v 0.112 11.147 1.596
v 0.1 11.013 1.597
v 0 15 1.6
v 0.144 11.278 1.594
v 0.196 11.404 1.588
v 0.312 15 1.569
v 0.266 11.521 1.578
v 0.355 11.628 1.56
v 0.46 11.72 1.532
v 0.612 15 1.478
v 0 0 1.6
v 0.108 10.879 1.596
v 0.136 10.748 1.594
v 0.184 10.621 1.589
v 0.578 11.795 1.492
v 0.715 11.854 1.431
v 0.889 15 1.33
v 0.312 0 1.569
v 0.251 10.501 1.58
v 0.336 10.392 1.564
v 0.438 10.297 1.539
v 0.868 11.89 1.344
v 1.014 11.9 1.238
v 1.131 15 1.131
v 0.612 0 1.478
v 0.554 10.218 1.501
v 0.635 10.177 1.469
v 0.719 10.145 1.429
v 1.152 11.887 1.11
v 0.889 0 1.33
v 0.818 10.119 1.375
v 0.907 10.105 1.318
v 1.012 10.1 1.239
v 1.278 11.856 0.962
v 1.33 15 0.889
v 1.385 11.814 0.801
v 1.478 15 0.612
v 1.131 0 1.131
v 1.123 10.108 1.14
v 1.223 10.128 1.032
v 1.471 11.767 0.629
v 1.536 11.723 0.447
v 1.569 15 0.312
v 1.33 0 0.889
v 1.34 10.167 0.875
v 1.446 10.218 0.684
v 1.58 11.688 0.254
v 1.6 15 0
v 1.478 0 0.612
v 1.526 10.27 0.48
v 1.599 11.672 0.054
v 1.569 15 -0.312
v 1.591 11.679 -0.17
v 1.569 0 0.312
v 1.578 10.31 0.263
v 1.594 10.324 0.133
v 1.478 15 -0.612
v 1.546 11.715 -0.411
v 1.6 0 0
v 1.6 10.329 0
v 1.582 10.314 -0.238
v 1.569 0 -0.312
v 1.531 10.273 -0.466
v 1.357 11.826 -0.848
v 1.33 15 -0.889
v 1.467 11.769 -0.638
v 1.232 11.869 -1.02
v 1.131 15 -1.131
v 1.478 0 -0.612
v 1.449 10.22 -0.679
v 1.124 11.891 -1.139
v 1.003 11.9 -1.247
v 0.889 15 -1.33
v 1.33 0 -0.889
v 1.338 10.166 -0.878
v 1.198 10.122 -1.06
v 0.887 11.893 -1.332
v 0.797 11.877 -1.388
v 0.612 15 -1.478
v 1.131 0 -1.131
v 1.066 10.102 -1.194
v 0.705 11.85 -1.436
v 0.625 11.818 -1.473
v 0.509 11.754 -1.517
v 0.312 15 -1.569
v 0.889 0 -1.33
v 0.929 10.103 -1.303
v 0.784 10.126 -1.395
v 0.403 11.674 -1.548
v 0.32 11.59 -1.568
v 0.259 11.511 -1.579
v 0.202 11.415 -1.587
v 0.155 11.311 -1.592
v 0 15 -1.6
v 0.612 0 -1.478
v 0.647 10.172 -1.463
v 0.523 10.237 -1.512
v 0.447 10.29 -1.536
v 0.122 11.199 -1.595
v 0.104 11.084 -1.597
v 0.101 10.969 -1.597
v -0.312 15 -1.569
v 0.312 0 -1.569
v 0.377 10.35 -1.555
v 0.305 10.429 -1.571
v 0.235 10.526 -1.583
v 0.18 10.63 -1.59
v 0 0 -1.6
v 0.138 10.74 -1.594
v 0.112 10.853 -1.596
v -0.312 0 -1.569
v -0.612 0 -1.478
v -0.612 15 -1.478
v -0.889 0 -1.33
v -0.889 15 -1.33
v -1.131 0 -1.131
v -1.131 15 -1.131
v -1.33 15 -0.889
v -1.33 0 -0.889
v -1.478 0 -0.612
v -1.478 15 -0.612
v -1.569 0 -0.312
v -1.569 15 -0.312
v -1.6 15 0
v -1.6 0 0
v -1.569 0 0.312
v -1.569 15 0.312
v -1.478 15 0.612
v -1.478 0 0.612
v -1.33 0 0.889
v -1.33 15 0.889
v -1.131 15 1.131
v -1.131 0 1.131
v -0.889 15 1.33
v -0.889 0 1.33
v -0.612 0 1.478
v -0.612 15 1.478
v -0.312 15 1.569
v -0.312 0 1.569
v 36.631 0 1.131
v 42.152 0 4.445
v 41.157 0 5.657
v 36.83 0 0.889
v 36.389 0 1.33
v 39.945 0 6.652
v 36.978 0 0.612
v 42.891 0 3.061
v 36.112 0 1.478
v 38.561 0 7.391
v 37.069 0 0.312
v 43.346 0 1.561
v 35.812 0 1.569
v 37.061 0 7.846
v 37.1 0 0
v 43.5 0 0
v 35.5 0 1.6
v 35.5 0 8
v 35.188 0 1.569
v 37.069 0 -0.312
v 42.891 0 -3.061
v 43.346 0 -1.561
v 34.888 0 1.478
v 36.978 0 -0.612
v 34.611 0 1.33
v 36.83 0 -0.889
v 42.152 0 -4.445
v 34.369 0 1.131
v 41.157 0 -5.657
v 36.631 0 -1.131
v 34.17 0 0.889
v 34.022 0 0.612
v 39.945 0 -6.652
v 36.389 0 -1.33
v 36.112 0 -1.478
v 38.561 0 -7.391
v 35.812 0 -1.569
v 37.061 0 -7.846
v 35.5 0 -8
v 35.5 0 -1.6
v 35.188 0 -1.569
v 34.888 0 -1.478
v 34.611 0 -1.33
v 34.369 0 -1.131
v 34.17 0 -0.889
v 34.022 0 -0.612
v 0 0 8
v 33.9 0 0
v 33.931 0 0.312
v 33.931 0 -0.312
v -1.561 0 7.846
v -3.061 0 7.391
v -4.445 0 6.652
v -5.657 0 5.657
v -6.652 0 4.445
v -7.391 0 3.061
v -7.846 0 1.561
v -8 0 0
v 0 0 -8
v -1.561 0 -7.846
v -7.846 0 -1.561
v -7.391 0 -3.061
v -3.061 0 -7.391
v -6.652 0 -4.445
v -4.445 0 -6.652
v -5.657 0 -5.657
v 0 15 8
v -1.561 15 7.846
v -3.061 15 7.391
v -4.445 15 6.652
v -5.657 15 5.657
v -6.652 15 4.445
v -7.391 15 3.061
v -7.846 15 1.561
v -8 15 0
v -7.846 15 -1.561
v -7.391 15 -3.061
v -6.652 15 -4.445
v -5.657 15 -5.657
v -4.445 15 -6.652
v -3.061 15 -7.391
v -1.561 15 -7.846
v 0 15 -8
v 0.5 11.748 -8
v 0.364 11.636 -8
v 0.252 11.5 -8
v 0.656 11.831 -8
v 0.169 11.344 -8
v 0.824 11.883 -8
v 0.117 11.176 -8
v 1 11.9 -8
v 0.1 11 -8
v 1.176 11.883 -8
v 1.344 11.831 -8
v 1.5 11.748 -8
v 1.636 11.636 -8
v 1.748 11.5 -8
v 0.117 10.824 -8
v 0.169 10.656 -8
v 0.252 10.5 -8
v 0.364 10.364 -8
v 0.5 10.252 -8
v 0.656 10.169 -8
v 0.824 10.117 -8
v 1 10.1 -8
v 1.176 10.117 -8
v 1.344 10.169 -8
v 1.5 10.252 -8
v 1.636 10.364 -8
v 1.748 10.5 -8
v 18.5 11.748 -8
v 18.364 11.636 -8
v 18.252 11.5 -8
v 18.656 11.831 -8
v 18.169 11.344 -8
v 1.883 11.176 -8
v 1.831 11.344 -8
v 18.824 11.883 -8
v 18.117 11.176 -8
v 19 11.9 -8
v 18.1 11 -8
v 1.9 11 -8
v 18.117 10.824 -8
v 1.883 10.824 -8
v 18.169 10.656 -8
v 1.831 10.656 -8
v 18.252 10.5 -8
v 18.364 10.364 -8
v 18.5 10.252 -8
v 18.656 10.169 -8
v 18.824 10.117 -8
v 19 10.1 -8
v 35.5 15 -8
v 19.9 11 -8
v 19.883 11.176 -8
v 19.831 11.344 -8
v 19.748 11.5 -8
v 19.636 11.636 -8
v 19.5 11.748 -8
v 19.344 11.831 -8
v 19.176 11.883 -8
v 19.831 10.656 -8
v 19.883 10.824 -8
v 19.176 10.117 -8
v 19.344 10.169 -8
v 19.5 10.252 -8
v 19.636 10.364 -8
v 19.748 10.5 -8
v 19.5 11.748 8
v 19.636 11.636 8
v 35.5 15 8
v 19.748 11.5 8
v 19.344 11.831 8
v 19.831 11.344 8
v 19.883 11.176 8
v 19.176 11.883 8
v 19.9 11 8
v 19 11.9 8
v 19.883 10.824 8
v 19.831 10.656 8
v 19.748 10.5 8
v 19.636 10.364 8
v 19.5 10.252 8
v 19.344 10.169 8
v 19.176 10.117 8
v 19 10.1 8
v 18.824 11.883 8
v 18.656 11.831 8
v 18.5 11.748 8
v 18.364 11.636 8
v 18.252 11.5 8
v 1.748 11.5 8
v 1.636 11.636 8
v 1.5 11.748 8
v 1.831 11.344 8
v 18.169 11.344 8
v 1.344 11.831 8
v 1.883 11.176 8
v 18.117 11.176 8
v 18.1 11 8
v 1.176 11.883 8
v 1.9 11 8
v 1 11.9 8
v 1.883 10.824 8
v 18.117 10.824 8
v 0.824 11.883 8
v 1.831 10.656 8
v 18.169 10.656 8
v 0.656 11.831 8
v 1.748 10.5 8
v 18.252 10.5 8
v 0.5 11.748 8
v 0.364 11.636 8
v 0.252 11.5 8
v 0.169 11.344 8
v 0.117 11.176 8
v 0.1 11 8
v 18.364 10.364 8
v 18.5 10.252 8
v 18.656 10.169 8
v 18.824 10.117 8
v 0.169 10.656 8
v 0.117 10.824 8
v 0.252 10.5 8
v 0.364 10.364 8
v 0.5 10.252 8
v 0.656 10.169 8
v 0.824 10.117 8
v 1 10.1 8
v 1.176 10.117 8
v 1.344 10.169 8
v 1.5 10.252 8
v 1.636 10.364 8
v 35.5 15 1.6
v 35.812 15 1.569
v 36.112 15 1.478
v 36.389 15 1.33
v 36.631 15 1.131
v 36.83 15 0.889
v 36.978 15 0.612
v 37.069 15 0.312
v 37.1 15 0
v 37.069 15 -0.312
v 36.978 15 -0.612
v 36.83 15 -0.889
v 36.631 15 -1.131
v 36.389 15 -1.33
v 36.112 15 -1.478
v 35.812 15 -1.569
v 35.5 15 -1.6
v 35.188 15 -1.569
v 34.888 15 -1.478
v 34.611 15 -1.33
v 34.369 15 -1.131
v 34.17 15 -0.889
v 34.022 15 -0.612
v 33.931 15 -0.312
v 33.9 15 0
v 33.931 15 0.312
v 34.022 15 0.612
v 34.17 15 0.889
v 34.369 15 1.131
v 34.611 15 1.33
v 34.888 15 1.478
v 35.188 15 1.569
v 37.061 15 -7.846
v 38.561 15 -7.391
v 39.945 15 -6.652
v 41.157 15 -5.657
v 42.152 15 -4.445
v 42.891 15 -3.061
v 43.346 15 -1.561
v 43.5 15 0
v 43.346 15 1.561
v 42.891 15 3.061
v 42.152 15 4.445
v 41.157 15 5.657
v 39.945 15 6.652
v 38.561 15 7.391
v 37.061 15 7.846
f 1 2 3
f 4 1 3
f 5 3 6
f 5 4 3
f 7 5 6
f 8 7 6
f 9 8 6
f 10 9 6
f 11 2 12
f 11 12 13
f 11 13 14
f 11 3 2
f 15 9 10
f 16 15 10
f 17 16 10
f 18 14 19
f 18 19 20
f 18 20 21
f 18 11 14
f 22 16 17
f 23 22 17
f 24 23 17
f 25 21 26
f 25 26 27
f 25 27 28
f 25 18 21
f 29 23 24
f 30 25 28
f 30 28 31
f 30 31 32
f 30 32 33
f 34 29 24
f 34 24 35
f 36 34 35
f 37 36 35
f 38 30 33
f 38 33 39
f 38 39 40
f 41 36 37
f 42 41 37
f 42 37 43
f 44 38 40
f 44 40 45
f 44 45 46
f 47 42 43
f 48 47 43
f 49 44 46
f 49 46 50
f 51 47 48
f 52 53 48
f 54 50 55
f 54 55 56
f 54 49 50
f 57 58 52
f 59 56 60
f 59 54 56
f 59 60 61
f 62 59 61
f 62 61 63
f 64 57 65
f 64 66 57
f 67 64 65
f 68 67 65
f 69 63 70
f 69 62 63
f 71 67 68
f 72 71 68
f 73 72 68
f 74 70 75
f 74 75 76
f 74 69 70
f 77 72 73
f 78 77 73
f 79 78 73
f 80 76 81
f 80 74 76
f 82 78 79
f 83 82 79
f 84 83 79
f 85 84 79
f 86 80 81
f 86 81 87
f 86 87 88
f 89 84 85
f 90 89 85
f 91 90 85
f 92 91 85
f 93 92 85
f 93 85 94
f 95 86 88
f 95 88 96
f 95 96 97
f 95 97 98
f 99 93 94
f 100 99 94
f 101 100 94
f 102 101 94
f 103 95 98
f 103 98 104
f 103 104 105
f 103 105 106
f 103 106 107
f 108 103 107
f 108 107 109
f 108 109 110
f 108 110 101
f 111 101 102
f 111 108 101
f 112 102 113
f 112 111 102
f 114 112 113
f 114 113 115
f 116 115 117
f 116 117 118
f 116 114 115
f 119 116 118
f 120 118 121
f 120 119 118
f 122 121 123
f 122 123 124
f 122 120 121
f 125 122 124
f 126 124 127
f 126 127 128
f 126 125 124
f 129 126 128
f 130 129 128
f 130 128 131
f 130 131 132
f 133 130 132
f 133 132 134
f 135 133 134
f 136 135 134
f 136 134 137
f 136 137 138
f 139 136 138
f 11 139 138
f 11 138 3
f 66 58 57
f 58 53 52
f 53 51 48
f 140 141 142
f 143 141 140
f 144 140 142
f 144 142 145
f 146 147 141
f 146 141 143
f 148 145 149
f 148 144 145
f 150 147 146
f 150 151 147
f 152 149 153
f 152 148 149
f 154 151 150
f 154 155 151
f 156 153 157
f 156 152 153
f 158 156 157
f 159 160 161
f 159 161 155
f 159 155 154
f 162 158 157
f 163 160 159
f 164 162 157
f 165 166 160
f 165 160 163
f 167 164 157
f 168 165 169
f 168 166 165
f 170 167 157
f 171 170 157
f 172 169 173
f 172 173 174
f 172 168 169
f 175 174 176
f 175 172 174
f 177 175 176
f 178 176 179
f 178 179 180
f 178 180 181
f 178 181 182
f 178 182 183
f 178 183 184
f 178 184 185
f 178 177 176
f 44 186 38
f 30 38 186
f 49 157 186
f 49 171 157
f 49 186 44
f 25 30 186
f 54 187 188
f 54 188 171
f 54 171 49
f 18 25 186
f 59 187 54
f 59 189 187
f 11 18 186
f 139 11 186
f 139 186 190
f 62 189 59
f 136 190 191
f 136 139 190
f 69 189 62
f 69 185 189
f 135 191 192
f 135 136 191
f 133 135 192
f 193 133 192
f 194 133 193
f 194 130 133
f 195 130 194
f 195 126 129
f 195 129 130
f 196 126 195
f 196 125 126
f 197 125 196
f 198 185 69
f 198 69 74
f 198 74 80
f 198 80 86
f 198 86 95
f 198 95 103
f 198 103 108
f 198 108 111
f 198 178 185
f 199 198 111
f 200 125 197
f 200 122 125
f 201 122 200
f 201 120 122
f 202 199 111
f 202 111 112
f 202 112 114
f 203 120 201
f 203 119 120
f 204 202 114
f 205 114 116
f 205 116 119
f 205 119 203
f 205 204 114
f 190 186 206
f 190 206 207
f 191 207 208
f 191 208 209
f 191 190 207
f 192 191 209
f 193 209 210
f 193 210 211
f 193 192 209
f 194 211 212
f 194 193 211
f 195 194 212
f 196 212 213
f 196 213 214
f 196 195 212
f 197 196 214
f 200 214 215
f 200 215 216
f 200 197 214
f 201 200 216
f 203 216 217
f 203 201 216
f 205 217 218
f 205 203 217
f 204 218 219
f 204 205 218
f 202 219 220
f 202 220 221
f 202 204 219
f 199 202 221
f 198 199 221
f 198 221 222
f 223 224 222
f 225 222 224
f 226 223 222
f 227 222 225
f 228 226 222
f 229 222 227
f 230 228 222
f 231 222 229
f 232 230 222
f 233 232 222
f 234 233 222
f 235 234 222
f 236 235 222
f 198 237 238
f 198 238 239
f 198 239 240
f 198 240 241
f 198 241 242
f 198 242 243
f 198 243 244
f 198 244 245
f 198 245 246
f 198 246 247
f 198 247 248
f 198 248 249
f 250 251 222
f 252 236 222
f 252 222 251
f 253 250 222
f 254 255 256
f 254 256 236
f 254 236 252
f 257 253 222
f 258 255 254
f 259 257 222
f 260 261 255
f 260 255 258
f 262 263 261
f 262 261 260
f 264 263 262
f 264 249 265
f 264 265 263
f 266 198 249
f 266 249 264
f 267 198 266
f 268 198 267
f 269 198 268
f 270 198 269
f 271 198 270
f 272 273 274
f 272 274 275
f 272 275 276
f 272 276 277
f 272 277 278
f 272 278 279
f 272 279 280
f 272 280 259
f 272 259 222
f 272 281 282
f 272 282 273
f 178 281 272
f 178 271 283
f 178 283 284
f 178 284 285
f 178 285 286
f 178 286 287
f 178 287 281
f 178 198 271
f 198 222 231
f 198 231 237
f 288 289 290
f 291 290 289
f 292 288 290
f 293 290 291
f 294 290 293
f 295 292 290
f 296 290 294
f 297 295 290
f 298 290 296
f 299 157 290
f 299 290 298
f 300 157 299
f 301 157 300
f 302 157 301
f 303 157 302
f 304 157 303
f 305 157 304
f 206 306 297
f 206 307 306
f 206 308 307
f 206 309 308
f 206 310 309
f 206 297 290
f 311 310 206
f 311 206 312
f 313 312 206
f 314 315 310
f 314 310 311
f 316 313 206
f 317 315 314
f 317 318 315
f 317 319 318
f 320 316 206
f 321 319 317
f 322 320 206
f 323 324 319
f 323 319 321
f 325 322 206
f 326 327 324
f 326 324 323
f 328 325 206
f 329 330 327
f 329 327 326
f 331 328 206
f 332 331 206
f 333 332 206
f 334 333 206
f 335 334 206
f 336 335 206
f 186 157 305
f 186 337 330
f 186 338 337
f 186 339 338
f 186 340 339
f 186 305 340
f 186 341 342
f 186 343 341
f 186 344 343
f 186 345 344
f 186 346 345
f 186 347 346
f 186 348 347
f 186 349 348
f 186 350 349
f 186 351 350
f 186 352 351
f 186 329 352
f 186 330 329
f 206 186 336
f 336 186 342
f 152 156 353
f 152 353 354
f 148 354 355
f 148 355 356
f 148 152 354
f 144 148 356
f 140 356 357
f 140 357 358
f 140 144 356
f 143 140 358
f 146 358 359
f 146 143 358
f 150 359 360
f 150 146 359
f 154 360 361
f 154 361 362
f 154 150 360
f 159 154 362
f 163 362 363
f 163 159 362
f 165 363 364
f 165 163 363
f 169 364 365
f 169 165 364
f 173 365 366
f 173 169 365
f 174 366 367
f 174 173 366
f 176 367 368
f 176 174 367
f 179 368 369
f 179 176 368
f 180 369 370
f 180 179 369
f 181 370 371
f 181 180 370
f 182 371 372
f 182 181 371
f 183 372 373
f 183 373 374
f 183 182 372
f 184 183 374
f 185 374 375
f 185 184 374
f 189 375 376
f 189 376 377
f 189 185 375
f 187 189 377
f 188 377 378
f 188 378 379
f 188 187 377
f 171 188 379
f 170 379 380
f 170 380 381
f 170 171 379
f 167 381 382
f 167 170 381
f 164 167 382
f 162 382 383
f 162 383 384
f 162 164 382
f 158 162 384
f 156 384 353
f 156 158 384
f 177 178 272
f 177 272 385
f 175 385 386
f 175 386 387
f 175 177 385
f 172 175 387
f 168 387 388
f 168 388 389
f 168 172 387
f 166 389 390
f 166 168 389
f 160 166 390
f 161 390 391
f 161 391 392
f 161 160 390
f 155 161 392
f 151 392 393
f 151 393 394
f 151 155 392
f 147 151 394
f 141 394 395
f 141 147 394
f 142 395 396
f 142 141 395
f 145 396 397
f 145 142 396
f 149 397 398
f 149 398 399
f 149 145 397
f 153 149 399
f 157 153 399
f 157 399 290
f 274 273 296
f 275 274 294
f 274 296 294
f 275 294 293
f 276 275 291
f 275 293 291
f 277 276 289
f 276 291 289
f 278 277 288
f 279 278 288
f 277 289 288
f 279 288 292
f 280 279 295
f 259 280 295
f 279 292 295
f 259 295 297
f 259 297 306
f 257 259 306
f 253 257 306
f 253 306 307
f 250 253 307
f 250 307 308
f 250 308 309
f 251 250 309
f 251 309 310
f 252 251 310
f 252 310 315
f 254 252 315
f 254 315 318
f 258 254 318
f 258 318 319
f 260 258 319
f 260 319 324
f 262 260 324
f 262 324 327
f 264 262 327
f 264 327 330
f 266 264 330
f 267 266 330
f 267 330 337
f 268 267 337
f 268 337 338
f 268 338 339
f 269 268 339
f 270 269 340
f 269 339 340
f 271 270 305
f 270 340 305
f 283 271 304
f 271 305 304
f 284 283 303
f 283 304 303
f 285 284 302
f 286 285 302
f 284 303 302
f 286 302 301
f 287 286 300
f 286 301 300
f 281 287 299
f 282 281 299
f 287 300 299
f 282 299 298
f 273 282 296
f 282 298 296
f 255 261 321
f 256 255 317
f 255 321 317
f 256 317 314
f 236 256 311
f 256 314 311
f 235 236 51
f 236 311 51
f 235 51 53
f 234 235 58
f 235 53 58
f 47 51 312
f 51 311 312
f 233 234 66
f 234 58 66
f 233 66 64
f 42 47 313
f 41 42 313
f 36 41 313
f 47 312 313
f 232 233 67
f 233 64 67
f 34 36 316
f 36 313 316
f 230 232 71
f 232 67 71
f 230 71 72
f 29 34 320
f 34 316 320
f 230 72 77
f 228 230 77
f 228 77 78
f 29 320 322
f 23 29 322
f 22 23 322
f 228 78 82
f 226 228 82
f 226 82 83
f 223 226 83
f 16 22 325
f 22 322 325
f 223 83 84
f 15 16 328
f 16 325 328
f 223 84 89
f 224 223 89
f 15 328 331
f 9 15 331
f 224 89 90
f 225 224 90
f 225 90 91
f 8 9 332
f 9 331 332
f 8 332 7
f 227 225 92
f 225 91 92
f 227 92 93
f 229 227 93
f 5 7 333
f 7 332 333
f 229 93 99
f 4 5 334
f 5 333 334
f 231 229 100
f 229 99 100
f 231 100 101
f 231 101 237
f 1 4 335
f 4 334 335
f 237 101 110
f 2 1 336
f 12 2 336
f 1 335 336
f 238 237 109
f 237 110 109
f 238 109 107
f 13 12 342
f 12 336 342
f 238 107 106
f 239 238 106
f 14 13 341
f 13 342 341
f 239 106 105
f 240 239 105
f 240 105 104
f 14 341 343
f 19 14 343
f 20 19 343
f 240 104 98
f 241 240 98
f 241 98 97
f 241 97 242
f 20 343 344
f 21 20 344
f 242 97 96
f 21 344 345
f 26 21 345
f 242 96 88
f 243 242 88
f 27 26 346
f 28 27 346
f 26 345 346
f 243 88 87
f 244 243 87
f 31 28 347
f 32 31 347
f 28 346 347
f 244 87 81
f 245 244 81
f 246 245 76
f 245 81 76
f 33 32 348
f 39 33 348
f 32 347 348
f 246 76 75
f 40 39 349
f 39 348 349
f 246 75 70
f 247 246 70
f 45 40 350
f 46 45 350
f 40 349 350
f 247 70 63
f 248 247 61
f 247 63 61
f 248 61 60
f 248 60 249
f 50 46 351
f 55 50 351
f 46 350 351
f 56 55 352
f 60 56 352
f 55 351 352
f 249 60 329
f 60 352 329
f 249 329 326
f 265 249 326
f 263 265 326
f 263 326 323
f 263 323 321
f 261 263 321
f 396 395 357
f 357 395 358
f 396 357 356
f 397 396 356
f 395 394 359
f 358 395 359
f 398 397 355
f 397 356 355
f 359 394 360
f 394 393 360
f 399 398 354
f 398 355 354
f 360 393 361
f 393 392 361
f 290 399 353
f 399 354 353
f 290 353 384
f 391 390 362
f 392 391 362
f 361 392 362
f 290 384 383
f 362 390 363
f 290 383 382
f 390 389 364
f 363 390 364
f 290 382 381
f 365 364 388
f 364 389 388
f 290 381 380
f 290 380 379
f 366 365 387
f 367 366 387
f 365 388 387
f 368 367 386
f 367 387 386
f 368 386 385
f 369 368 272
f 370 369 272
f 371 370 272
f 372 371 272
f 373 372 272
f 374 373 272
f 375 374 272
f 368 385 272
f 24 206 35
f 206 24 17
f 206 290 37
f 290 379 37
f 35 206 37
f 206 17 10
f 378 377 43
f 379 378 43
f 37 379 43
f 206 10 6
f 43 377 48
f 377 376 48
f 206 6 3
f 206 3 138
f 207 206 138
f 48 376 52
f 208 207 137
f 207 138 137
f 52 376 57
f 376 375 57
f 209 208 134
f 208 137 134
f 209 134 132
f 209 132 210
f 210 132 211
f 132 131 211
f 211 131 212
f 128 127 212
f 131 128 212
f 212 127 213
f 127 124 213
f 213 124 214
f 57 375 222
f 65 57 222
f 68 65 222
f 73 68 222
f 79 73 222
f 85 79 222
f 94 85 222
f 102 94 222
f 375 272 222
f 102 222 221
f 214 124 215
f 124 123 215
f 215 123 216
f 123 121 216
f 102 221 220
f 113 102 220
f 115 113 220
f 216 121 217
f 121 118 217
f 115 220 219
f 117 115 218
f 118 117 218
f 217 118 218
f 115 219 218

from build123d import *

# Parameters (mm, degrees)
SKETCH_1_R          = 1.6
EXTRUDE_1_DEPTH     = 15
SKETCH_2_R          = 0.9
CUT_EXTRUDE_1_DEPTH = 49.716013794


with BuildPart() as part:
    # 草图1 → 凸台-拉伸1 (new body)
    with BuildSketch(Plane(origin=(0, 0, 0), x_dir=(1, 0, 0), z_dir=(0, 1, 0))):
        with BuildLine():
            Line((0, 8), (35.5, 8))
            ThreePointArc((35.5, 8), (43.5, 0), (35.5, -8))
            Line((35.5, -8), (0, -8))
            ThreePointArc((0, -8), (-8, 0), (0, 8))
        make_face()
        with Locations(Location((35.5, 0, 0), (0, 0, 270))):
            Circle(SKETCH_1_R, mode=Mode.SUBTRACT)
        with Locations(Location((0, 0, 0), (0, 0, 270))):
            Circle(SKETCH_1_R, mode=Mode.SUBTRACT)
    extrude(amount=EXTRUDE_1_DEPTH)

    # 草图2 → 切除-拉伸1 (cut, through all)
    with BuildSketch(Plane.XY.offset(8)):
        with Locations((19, 11)):
            Circle(SKETCH_2_R)
        with Locations((1, 11)):
            Circle(SKETCH_2_R)
    extrude(amount=-CUT_EXTRUDE_1_DEPTH, mode=Mode.SUBTRACT)


solid = part.part
